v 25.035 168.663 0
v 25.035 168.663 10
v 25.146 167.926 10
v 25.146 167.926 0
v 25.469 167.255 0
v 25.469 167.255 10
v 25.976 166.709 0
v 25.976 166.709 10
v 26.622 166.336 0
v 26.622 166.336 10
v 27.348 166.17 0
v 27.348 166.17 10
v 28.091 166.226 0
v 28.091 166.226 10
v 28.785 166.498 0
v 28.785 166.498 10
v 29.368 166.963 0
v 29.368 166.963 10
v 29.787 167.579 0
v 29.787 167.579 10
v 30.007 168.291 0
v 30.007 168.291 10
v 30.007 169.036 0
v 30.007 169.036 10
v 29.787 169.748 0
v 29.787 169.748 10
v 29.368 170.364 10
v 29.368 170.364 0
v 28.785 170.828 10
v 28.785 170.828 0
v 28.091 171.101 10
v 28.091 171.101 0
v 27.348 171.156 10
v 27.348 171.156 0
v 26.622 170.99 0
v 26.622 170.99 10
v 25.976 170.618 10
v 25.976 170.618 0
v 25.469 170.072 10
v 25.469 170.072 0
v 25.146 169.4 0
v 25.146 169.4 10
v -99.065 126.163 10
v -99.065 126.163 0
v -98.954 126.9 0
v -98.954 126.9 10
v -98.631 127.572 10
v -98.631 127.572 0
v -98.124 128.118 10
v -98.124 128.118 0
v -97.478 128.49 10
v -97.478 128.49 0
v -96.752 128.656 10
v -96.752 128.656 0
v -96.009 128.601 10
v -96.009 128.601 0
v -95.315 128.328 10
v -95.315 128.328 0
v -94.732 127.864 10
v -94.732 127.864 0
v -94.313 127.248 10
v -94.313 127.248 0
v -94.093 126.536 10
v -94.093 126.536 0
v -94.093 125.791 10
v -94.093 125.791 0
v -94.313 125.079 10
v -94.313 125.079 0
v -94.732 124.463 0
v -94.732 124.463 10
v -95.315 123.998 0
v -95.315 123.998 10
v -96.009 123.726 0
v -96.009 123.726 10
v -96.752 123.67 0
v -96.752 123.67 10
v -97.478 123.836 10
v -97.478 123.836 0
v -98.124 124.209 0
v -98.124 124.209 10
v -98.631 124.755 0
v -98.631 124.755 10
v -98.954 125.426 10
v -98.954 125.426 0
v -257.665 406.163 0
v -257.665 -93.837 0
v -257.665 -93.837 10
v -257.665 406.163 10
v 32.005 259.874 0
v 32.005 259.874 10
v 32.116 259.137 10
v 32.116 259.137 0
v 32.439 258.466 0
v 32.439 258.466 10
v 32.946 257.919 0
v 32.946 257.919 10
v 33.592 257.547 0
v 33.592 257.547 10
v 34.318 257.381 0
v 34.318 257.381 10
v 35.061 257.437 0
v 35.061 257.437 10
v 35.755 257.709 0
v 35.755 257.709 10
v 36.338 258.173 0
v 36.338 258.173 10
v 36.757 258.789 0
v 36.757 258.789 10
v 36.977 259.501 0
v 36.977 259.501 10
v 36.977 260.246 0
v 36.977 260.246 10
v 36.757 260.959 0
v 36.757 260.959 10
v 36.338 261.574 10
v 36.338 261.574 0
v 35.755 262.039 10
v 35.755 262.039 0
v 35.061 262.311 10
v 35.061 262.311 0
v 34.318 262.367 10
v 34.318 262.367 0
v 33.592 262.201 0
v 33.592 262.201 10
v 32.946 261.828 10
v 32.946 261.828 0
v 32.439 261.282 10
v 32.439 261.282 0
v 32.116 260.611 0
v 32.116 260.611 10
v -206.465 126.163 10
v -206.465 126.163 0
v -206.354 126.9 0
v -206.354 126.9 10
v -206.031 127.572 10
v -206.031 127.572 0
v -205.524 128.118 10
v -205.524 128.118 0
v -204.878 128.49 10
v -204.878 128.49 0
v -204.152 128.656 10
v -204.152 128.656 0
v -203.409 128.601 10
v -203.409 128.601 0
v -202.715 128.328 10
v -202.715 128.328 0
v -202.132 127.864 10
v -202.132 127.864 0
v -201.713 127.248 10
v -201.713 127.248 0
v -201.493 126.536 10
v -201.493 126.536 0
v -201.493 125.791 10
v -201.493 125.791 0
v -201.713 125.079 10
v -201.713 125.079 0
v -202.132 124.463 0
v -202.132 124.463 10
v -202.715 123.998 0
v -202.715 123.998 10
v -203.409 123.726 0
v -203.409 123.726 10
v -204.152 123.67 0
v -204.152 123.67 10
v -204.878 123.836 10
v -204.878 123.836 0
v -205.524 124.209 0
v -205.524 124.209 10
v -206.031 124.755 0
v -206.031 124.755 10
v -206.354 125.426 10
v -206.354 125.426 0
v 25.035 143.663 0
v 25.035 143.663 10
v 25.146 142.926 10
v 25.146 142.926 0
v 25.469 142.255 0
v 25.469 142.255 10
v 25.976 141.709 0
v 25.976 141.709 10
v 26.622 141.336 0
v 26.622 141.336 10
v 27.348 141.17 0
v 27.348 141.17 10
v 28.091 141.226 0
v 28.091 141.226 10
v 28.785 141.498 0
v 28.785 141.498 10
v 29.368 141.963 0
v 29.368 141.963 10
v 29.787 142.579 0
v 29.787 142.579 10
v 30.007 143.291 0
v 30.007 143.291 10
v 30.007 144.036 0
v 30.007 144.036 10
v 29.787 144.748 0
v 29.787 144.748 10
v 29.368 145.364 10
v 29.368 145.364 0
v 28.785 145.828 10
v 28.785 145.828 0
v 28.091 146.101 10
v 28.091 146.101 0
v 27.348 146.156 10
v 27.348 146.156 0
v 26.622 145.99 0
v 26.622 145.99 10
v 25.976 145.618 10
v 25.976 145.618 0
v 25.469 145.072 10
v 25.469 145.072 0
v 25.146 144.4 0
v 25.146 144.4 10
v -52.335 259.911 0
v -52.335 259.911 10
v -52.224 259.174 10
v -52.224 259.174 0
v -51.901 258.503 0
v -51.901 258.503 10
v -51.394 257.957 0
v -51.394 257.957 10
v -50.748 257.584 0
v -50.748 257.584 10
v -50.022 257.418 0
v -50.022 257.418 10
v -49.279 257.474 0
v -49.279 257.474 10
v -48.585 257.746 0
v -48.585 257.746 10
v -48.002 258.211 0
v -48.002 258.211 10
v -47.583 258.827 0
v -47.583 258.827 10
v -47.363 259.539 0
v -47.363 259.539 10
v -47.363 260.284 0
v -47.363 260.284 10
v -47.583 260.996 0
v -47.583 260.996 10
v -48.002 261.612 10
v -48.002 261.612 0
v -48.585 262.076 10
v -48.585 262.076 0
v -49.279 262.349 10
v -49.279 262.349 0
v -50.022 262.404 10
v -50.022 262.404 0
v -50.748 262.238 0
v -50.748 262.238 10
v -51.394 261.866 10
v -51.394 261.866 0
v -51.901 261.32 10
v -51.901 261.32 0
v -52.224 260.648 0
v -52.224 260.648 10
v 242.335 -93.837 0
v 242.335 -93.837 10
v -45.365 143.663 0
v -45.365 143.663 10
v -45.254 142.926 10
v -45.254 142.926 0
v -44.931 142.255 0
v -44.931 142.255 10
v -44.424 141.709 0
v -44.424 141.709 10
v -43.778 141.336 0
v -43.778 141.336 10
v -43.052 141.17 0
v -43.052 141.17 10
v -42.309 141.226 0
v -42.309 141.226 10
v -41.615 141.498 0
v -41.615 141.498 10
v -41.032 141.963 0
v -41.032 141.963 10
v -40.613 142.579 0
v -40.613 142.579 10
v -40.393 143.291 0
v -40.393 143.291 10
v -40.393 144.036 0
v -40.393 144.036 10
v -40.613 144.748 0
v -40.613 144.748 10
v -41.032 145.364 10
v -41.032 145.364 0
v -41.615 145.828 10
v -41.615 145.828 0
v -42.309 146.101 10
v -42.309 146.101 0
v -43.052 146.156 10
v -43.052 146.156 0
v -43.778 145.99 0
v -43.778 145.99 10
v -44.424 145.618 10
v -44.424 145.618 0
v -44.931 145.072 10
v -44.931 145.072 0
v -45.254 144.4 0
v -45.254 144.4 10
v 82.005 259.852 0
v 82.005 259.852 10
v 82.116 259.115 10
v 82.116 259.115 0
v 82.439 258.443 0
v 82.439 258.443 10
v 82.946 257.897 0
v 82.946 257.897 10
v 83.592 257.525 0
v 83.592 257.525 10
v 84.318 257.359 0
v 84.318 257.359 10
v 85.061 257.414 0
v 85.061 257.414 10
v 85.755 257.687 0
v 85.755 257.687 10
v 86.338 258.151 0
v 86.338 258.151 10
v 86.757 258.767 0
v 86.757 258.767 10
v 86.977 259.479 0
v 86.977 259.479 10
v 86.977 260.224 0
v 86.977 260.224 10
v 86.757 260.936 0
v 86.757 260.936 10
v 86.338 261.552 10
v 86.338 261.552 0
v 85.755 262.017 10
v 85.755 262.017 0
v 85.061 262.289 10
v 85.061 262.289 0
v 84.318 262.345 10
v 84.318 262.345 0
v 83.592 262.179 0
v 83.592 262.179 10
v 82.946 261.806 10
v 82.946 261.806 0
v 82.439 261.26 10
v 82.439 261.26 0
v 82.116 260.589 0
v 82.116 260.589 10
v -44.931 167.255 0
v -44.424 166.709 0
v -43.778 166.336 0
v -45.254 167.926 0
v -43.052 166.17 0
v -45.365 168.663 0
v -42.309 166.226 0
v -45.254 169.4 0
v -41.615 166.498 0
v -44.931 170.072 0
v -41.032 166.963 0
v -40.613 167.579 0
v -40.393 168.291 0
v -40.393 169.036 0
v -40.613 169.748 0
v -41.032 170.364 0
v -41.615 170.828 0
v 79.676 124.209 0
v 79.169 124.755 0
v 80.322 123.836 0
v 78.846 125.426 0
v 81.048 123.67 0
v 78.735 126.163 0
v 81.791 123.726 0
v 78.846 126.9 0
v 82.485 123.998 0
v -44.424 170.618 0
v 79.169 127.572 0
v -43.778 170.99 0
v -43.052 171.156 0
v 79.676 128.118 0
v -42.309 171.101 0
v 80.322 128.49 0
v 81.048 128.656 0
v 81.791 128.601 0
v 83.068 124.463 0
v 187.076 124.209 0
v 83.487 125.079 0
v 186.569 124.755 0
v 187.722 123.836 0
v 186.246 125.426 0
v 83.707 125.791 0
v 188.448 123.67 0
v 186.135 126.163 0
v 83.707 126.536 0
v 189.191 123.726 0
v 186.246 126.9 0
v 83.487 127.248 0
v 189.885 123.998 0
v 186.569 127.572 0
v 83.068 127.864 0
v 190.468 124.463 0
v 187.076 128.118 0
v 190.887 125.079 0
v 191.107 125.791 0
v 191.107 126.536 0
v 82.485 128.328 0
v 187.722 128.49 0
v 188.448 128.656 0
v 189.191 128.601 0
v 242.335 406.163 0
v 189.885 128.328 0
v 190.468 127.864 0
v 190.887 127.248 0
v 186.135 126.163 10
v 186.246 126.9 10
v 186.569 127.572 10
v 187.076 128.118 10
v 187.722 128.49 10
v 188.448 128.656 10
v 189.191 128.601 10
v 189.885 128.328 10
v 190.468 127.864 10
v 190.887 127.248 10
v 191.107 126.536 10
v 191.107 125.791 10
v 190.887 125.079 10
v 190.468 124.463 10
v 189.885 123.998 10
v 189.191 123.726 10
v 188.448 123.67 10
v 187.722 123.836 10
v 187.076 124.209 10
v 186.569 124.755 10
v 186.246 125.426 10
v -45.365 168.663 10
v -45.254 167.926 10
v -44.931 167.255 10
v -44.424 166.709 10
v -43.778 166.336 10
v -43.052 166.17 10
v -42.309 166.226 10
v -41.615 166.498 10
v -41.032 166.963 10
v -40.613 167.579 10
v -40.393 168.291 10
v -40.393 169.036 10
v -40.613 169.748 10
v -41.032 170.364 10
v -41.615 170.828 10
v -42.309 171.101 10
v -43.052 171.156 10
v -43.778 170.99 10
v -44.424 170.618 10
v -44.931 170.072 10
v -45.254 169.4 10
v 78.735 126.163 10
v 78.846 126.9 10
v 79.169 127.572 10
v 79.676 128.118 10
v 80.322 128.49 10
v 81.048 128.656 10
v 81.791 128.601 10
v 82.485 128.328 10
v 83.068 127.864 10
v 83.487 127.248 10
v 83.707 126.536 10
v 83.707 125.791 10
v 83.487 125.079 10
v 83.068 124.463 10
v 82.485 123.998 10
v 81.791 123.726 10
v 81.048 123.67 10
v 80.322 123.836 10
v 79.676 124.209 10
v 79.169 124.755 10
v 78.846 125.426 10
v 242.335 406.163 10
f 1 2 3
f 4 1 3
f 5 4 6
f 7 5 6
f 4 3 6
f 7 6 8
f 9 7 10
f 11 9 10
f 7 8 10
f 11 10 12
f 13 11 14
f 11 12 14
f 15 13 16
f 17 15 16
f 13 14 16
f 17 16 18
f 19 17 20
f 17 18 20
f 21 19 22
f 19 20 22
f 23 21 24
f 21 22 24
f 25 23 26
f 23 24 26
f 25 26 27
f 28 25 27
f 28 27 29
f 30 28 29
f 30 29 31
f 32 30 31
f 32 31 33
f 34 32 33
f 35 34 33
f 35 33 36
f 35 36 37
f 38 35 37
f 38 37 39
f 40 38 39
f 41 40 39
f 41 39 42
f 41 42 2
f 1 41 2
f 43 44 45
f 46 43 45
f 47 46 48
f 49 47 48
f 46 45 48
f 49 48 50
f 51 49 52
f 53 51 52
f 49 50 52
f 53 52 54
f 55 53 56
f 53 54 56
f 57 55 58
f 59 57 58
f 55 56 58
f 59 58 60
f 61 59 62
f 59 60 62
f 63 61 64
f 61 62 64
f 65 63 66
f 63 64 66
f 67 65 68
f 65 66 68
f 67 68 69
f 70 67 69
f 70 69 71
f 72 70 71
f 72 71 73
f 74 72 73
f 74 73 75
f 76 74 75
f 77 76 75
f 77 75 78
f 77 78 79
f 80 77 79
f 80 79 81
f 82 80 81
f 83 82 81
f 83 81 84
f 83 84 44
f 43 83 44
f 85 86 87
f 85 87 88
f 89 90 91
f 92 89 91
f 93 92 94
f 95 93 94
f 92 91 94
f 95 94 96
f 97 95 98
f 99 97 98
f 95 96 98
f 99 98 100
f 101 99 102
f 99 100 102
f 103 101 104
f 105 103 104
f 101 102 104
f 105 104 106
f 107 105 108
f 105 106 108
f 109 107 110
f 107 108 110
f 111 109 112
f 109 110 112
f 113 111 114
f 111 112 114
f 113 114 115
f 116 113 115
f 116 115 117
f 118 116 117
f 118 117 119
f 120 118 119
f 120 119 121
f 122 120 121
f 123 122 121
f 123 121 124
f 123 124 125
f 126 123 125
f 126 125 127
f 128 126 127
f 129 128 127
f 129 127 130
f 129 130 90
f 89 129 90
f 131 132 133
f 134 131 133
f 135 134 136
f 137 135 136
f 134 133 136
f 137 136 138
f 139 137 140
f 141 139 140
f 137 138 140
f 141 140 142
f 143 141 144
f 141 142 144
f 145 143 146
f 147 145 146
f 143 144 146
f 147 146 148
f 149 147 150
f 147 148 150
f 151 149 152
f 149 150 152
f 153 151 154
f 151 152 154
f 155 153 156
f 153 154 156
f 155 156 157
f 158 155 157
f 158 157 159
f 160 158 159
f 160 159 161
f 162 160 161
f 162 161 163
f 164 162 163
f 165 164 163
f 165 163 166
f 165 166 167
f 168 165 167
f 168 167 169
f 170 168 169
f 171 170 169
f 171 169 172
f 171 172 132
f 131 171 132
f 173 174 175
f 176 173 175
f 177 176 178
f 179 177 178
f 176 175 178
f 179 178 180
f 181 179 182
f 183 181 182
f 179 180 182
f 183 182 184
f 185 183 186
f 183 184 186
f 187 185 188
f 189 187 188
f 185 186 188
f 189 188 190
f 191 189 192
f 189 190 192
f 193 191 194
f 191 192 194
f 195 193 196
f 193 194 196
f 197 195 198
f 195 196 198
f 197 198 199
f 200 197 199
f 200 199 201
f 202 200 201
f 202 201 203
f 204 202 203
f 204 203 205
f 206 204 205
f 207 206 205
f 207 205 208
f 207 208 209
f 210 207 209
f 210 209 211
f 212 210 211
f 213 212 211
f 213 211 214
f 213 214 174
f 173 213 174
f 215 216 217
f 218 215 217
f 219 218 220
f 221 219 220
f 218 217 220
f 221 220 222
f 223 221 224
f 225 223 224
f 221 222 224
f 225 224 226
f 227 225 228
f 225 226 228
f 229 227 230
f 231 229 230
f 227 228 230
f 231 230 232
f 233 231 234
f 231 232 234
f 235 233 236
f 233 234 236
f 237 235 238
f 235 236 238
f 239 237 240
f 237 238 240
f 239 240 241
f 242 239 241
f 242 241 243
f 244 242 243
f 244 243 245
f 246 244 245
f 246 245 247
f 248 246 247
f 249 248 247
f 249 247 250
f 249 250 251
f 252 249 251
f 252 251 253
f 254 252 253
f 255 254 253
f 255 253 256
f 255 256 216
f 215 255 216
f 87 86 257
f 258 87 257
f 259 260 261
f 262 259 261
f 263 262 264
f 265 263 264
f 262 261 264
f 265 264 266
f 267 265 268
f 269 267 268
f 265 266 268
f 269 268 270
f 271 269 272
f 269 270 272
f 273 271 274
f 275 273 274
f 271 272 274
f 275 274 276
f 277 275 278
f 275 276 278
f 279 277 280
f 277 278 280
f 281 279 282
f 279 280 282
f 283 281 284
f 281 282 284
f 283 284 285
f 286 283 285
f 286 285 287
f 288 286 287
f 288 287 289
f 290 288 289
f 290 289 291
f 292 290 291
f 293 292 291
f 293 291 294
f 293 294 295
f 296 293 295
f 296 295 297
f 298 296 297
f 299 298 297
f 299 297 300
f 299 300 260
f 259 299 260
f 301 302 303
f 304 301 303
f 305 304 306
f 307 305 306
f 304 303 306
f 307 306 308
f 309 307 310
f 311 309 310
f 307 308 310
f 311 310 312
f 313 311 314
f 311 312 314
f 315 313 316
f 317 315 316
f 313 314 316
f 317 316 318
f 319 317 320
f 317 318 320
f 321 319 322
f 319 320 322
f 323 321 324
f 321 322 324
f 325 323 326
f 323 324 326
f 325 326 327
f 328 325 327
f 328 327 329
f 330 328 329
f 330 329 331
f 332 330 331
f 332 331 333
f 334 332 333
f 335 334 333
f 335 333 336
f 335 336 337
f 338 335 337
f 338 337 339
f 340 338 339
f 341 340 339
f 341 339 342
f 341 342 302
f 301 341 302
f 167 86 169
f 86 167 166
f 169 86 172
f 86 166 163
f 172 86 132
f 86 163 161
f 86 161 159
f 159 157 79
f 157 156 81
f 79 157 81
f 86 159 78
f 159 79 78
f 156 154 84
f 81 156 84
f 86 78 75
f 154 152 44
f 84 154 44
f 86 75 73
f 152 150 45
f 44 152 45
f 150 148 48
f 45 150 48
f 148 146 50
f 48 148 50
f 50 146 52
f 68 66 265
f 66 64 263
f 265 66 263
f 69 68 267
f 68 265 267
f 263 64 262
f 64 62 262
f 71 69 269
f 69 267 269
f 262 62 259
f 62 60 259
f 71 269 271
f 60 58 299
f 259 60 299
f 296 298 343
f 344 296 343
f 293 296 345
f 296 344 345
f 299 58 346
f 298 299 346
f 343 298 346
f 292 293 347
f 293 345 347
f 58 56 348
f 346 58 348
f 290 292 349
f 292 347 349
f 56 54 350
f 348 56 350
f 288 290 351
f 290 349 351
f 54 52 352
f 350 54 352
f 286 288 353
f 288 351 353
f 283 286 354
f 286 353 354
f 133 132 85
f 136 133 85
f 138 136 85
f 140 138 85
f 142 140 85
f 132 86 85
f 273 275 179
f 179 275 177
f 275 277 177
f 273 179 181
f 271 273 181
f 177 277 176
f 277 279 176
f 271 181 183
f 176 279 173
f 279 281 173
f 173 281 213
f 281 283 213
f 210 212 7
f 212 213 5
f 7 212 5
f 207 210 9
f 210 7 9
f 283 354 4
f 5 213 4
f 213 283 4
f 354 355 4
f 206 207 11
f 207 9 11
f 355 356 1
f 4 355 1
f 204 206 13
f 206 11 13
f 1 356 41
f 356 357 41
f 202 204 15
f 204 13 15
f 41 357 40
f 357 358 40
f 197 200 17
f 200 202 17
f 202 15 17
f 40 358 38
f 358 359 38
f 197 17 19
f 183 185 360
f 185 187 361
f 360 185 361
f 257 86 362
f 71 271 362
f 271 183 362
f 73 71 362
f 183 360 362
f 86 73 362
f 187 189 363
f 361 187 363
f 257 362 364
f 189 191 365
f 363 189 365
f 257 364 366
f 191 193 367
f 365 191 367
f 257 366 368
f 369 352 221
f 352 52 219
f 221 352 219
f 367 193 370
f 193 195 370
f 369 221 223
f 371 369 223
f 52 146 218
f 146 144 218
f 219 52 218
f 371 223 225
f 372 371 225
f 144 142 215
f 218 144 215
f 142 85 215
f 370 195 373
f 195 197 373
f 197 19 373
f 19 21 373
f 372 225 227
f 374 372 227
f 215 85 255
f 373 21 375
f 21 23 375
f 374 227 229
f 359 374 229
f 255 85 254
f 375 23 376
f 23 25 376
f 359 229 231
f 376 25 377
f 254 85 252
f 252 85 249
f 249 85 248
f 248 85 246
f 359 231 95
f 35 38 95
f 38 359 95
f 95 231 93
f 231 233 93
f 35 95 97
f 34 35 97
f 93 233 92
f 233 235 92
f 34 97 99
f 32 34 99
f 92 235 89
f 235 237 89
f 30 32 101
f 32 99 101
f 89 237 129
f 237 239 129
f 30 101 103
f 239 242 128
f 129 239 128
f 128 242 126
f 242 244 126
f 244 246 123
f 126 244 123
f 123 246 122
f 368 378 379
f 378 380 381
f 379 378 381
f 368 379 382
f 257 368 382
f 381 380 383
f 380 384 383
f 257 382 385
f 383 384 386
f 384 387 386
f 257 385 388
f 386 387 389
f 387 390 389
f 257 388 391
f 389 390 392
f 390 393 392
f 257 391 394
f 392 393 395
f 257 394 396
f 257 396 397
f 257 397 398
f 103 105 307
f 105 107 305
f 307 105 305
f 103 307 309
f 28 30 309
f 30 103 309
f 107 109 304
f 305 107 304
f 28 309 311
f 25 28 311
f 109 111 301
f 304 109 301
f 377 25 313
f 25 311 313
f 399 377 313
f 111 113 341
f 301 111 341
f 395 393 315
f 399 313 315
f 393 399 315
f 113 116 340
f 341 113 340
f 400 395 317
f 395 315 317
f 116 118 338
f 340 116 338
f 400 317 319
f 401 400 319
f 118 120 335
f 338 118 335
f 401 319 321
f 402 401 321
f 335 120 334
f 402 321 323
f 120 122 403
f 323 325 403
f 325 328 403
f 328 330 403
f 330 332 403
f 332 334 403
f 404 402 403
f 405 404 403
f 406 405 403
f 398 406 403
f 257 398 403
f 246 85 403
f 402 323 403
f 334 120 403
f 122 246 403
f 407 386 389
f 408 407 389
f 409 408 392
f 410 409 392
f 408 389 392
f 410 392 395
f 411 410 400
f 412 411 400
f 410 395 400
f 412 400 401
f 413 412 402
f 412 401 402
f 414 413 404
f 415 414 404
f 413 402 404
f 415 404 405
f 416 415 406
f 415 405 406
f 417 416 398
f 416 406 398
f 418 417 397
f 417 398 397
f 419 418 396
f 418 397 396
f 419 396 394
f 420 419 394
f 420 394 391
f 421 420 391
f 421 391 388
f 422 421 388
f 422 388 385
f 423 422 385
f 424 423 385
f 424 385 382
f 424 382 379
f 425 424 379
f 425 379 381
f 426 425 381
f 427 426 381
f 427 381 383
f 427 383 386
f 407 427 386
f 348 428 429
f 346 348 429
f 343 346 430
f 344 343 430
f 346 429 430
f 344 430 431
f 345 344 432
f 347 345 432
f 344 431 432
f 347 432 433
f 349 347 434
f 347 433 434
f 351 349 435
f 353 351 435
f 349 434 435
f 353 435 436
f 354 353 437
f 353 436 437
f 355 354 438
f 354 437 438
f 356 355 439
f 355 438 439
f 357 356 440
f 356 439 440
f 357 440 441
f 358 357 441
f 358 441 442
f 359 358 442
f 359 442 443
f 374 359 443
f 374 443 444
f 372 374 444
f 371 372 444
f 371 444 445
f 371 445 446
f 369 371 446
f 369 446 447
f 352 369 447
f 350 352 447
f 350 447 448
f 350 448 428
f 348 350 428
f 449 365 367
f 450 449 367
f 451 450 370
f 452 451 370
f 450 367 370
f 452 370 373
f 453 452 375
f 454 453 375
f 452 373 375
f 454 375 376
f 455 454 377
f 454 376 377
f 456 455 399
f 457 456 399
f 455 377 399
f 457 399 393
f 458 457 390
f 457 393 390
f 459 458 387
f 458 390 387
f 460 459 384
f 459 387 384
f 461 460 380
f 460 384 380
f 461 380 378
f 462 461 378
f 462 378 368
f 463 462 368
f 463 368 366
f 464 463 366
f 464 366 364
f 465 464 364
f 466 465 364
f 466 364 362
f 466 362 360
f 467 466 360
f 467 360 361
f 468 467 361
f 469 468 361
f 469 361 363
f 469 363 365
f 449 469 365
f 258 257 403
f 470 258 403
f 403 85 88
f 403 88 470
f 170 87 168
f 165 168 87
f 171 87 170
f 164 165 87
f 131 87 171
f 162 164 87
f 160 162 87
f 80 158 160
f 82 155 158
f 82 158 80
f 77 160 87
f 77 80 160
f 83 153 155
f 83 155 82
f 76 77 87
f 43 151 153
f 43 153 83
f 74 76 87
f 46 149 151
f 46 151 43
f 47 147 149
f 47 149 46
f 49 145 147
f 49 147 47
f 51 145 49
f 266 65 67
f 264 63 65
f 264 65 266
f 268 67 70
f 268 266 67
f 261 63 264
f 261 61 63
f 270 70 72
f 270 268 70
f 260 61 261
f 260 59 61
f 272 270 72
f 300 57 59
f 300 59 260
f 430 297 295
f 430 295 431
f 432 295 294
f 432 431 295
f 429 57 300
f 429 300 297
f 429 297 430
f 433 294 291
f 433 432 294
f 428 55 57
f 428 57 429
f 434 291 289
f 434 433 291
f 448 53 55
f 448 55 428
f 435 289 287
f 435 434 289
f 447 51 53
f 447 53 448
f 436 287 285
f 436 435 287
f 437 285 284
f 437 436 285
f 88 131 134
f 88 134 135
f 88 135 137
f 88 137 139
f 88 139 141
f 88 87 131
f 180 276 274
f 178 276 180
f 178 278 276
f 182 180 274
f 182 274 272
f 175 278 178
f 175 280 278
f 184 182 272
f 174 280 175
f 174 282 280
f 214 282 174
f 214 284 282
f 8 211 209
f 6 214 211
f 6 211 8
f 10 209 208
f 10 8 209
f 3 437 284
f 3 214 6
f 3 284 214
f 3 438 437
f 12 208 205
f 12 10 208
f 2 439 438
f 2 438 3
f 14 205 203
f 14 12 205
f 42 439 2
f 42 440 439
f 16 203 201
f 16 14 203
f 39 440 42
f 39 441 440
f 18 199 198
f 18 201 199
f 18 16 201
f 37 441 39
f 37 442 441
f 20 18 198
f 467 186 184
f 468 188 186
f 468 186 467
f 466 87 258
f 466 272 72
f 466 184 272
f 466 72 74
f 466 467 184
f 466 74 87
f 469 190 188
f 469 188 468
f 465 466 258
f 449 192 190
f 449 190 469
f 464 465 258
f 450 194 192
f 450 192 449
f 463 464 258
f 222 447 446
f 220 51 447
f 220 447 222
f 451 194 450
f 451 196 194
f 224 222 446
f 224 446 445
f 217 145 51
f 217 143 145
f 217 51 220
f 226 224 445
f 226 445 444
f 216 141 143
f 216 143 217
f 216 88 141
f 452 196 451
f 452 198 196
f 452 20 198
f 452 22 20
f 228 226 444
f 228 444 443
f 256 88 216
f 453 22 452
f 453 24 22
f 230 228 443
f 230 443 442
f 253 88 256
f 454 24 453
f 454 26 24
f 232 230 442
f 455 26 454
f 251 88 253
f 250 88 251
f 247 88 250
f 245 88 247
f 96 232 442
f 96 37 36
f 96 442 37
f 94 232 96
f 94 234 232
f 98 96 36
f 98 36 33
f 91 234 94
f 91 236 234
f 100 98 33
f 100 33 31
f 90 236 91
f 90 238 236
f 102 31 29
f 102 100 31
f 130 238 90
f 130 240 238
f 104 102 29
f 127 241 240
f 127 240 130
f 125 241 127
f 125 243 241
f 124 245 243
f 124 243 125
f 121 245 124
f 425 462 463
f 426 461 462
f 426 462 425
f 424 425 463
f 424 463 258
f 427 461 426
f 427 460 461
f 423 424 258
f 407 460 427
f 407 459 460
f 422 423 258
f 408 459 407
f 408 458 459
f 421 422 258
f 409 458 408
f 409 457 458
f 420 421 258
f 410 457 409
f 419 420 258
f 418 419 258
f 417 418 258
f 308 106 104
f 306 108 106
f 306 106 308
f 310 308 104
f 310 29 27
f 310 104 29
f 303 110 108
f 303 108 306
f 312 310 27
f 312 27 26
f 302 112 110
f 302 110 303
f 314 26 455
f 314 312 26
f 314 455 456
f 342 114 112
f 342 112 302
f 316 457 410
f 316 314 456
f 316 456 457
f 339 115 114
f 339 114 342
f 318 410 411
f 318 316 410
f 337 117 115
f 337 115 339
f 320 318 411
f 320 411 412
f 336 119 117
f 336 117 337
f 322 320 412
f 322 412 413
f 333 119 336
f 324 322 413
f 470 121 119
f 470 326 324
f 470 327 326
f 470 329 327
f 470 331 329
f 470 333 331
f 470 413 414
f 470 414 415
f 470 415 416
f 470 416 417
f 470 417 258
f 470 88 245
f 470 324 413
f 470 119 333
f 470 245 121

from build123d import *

# Parameters (mm, degrees)
F0_W     = 500
F0_H     = 500
F1_DEPTH = 10
F3_D     = 5
F5_D     = 5


with BuildPart() as f1:
    # F0 (on Top) → F1 (new body)
    with BuildSketch(Plane.XY):
        with Locations((-7.665122, 156.163306)):
            Rectangle(F0_W, F0_H)
    extrude(amount=F1_DEPTH)

    # F3 (through all)
    with Locations(Plane(origin=(0, 0, 0), x_dir=(1, 0, 0), z_dir=(0, 0, -1))):
        with Locations((-42.865122, -143.663306), (27.534878, -143.663306), (27.534878, -168.663306), (-42.865122, -168.663306), (-49.835122, -259.91124), (34.504878, -259.873878), (84.504873, -259.851729)):
            Hole(F3_D / 2)

    # F5 (through all)
    with Locations(Plane.XY.offset(10)):
        with Locations((-203.965122, 126.163306), (-96.565122, 126.163306), (81.234878, 126.163306), (188.634878, 126.163306)):
            Hole(F5_D / 2)


solid = f1.part
